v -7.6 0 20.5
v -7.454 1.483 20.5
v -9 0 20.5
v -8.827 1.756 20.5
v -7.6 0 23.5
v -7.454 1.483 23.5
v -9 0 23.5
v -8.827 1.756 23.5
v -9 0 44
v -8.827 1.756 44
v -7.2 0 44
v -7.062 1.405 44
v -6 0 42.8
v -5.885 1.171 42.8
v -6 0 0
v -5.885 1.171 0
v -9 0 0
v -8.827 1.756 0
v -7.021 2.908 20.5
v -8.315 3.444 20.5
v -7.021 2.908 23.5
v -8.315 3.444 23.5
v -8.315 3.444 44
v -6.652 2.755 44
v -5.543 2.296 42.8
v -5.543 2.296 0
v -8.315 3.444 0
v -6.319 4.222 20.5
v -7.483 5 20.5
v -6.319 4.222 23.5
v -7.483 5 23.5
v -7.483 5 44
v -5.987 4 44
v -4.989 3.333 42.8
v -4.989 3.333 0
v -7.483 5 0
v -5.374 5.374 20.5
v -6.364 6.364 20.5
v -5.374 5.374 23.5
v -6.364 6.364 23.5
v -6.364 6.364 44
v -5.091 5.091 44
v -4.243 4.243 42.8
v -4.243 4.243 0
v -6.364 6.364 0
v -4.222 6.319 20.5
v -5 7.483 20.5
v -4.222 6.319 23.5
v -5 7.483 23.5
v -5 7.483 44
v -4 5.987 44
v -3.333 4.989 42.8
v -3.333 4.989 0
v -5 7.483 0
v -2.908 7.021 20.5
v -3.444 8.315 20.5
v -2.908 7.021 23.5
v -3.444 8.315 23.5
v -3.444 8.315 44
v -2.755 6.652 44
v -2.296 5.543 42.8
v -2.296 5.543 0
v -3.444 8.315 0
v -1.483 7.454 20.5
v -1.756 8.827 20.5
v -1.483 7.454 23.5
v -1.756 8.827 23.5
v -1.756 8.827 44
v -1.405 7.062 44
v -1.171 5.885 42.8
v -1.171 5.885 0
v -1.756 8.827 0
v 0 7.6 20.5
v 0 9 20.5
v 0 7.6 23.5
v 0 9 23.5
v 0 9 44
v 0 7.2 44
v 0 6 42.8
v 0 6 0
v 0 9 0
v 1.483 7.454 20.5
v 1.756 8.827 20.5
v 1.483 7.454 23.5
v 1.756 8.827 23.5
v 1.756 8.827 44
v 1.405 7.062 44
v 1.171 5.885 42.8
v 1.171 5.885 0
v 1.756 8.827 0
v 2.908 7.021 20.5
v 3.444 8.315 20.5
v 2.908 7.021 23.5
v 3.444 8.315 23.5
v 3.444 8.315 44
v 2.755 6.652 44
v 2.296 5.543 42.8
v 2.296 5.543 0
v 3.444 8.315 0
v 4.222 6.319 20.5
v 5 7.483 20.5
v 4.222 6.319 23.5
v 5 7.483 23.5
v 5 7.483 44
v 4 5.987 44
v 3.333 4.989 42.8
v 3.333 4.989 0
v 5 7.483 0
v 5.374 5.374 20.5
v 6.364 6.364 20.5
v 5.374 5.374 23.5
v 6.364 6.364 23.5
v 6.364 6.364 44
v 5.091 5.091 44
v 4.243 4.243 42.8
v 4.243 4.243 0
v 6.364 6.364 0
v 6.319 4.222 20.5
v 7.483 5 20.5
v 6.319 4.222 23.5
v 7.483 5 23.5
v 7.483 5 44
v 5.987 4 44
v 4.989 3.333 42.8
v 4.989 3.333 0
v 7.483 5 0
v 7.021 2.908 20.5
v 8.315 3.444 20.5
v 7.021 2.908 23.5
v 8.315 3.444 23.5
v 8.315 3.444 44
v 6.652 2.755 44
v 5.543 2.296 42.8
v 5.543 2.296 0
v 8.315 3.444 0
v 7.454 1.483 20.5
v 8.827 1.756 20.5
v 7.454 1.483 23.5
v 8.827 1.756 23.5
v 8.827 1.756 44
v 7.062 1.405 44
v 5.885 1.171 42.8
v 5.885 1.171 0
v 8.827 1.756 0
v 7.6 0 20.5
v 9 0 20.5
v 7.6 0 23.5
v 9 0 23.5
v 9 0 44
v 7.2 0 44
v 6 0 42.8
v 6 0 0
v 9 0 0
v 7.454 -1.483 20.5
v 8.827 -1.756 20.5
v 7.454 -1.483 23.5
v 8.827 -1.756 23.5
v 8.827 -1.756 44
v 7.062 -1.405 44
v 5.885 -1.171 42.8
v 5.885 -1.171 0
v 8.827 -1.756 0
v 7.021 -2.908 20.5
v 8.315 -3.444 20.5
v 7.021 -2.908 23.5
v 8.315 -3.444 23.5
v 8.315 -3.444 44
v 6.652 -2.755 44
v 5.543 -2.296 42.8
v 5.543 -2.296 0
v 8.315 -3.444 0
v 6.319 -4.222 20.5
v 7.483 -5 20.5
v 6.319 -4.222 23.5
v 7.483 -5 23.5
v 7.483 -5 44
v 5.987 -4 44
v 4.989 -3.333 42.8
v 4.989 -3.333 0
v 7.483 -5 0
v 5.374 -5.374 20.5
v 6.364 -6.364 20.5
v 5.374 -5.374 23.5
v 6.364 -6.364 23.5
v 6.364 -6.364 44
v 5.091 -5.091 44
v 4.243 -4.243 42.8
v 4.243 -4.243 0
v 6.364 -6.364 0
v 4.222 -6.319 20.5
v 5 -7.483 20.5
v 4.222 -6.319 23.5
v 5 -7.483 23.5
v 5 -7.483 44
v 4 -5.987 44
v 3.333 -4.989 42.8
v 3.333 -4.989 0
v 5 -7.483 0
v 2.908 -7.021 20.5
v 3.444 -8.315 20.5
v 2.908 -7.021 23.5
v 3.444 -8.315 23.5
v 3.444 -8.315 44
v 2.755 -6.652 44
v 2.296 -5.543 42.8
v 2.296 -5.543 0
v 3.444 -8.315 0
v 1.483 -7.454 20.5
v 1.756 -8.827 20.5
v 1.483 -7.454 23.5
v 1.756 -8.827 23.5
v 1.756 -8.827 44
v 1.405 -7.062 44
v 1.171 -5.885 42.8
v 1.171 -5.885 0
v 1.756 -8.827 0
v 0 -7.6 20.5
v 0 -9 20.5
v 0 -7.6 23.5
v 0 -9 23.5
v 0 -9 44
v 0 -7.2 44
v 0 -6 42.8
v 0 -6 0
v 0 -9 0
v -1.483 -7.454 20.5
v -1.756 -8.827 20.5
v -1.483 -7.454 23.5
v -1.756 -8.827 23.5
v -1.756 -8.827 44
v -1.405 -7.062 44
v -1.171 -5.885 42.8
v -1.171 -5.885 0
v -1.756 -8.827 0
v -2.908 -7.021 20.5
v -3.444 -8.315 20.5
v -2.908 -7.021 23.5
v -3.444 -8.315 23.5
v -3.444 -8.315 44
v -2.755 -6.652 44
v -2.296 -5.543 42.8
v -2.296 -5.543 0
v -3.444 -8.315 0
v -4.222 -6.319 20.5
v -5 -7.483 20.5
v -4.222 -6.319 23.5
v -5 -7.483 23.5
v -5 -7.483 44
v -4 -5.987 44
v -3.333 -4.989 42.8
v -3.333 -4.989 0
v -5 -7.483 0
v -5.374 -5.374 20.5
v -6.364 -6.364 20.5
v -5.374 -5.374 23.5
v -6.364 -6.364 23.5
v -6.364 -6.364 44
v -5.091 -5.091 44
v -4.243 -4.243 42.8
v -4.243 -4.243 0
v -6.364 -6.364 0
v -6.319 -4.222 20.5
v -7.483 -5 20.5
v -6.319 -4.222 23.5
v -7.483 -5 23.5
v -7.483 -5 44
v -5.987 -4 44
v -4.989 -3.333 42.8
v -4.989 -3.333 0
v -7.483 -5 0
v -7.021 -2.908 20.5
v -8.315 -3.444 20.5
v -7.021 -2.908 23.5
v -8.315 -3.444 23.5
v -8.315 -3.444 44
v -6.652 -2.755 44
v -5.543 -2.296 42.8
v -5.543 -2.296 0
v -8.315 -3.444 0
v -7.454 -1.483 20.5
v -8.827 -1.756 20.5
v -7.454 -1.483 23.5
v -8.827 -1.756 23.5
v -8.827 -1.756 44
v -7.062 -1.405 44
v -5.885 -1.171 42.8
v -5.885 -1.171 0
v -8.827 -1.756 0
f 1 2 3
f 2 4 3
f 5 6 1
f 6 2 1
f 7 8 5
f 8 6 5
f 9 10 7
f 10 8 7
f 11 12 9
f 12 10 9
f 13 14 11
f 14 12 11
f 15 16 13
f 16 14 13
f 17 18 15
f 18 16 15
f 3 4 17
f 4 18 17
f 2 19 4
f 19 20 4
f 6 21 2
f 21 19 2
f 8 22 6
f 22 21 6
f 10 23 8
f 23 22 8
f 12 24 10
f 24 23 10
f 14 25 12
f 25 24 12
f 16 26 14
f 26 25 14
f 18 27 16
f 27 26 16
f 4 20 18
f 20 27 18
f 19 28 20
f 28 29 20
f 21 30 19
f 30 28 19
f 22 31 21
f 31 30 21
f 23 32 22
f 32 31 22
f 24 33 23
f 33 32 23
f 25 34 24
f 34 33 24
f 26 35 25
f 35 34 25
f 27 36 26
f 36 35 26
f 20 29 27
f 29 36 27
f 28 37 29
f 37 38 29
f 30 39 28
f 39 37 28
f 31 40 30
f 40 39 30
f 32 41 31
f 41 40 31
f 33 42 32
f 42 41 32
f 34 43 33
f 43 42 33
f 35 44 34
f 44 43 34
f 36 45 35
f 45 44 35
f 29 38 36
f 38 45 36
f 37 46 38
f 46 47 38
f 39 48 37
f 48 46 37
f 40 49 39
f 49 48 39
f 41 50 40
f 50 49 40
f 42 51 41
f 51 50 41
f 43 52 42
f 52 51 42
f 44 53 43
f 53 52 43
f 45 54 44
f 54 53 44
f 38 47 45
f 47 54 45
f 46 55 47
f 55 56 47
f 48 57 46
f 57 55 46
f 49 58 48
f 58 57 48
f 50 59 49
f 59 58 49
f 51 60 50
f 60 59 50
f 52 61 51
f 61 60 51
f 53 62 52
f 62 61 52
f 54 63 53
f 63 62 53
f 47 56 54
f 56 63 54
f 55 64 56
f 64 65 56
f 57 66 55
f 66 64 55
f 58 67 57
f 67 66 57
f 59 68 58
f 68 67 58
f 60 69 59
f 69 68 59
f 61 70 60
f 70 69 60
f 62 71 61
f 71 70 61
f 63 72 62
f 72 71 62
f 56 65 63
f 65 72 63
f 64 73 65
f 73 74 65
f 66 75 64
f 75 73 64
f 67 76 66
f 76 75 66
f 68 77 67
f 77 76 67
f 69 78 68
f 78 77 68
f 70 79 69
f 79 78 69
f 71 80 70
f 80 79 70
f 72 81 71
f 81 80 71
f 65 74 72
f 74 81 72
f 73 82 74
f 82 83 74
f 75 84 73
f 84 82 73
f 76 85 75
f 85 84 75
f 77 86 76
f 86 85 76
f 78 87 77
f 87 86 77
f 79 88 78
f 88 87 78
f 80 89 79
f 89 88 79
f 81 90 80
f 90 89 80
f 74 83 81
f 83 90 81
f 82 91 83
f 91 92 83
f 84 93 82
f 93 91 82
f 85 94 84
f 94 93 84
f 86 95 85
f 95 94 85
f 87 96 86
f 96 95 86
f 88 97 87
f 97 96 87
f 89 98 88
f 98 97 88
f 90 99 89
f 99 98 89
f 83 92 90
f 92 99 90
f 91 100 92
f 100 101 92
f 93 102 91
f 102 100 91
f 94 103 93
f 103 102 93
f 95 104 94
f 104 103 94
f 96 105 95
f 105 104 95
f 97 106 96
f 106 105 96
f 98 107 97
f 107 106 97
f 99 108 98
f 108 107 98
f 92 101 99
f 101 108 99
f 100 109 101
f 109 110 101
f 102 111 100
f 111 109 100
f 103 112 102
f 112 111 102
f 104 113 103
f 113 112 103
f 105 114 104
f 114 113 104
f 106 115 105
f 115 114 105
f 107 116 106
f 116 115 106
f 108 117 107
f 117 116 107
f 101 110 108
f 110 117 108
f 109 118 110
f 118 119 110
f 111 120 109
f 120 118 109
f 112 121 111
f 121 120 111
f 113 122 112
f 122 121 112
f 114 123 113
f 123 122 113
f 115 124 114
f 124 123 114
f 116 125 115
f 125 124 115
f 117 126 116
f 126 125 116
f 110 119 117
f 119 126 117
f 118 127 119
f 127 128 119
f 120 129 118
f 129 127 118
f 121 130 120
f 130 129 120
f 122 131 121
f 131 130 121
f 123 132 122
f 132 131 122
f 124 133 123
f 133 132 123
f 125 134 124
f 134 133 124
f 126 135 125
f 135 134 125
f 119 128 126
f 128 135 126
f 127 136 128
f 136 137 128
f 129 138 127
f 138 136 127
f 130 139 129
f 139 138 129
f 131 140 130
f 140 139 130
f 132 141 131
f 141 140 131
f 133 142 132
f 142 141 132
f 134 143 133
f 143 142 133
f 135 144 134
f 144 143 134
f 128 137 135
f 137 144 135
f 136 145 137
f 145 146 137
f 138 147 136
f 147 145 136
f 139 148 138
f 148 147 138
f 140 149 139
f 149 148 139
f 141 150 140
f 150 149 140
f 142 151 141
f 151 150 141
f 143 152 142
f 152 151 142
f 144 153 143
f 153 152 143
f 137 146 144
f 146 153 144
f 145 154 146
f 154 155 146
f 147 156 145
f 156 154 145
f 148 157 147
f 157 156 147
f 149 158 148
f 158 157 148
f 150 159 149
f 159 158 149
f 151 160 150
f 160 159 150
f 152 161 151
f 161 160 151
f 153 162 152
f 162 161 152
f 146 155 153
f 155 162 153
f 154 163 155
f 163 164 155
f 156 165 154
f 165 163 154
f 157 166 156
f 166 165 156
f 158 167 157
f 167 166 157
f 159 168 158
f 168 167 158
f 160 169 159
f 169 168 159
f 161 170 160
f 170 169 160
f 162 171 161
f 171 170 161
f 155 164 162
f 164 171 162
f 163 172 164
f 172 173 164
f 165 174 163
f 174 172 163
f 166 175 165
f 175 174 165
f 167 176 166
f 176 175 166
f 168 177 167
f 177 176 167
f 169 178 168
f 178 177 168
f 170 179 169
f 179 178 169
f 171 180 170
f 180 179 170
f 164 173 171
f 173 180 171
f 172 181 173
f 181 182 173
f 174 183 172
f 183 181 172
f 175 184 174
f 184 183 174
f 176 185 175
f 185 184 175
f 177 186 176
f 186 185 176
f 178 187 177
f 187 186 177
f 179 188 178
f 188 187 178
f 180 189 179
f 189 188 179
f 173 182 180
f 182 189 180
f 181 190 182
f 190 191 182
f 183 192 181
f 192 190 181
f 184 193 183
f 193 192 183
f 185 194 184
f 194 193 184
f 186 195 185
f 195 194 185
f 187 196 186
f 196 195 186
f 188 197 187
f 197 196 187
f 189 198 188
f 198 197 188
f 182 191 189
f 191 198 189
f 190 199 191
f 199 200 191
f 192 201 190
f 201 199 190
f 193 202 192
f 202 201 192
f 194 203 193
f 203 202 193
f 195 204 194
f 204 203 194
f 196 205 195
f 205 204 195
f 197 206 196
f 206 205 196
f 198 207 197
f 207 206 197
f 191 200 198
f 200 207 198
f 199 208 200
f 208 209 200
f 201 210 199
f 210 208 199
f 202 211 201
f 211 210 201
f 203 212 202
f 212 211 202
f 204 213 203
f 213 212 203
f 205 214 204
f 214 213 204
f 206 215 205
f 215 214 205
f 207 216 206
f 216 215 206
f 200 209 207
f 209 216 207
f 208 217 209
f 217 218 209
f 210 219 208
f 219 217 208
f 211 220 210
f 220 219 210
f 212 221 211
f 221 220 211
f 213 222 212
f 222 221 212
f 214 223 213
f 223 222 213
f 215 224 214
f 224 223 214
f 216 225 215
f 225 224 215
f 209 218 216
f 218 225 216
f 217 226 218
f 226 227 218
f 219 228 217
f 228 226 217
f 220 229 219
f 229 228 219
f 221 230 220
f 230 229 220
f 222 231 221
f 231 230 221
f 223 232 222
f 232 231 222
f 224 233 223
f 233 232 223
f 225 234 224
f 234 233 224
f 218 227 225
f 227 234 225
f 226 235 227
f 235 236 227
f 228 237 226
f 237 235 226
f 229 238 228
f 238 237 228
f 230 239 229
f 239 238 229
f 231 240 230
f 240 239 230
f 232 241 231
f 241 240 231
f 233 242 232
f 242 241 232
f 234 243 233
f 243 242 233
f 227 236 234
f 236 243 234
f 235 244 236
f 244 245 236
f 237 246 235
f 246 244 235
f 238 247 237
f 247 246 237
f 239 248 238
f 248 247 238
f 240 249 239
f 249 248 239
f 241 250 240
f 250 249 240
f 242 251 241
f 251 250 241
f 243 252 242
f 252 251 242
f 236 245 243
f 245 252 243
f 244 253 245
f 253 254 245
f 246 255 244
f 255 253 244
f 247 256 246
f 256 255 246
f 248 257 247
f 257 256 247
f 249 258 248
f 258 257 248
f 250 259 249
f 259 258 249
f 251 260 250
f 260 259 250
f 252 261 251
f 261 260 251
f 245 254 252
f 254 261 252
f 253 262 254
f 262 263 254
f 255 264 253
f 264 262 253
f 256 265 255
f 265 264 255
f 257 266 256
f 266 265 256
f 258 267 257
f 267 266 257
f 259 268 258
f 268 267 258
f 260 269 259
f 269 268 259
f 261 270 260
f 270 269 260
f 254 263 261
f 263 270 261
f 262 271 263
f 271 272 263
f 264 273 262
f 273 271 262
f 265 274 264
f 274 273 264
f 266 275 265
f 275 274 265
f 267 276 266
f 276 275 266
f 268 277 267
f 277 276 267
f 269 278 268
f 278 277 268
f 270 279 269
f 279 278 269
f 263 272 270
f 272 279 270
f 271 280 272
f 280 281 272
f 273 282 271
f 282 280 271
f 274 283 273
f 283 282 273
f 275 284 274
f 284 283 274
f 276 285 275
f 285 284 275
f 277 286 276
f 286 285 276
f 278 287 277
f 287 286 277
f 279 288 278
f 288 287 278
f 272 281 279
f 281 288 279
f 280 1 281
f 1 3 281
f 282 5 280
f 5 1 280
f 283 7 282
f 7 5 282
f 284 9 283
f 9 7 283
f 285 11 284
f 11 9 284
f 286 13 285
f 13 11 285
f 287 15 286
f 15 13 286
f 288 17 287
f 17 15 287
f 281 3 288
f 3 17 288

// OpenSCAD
$fn = 32;

// ----------------------------------------------------------------------
// Grooved revolve: thread_relief, bore R6
// ----------------------------------------------------------------------

// --- parameters (mm) ---
bore_r = 6;               // bore radius
outer_r = 9;              // outer radius of the body
total_h = 44;             // overall height, Z
wall = 3;                 // radial wall thickness
groove_w = 3;             // groove width
groove_d = 1.4;           // groove depth
grooves = 1;              // number of outer grooves
relief = 1.2;             // thread relief leg at the bore mouth
relief_angle = 45;        // thread relief chamfer angle, degrees

bbox_x = 2 * outer_r;  // full diameter
bore_d = 2 * bore_r;  // bore diameter
body_d = 2 * outer_r;  // body diameter
revolve_angle = 360;  // full turn around the Z axis

profile = [[6, 0], [9, 0], [9, 20.5], [7.6, 20.5], [7.6, 23.5], [9, 23.5], [9, 44], [7.2, 44], [6, 42.8]];  // primary outline, 9 points, counter clockwise

// --- the one profile operation ---
rotate_extrude(angle = revolve_angle) polygon(points = profile);
